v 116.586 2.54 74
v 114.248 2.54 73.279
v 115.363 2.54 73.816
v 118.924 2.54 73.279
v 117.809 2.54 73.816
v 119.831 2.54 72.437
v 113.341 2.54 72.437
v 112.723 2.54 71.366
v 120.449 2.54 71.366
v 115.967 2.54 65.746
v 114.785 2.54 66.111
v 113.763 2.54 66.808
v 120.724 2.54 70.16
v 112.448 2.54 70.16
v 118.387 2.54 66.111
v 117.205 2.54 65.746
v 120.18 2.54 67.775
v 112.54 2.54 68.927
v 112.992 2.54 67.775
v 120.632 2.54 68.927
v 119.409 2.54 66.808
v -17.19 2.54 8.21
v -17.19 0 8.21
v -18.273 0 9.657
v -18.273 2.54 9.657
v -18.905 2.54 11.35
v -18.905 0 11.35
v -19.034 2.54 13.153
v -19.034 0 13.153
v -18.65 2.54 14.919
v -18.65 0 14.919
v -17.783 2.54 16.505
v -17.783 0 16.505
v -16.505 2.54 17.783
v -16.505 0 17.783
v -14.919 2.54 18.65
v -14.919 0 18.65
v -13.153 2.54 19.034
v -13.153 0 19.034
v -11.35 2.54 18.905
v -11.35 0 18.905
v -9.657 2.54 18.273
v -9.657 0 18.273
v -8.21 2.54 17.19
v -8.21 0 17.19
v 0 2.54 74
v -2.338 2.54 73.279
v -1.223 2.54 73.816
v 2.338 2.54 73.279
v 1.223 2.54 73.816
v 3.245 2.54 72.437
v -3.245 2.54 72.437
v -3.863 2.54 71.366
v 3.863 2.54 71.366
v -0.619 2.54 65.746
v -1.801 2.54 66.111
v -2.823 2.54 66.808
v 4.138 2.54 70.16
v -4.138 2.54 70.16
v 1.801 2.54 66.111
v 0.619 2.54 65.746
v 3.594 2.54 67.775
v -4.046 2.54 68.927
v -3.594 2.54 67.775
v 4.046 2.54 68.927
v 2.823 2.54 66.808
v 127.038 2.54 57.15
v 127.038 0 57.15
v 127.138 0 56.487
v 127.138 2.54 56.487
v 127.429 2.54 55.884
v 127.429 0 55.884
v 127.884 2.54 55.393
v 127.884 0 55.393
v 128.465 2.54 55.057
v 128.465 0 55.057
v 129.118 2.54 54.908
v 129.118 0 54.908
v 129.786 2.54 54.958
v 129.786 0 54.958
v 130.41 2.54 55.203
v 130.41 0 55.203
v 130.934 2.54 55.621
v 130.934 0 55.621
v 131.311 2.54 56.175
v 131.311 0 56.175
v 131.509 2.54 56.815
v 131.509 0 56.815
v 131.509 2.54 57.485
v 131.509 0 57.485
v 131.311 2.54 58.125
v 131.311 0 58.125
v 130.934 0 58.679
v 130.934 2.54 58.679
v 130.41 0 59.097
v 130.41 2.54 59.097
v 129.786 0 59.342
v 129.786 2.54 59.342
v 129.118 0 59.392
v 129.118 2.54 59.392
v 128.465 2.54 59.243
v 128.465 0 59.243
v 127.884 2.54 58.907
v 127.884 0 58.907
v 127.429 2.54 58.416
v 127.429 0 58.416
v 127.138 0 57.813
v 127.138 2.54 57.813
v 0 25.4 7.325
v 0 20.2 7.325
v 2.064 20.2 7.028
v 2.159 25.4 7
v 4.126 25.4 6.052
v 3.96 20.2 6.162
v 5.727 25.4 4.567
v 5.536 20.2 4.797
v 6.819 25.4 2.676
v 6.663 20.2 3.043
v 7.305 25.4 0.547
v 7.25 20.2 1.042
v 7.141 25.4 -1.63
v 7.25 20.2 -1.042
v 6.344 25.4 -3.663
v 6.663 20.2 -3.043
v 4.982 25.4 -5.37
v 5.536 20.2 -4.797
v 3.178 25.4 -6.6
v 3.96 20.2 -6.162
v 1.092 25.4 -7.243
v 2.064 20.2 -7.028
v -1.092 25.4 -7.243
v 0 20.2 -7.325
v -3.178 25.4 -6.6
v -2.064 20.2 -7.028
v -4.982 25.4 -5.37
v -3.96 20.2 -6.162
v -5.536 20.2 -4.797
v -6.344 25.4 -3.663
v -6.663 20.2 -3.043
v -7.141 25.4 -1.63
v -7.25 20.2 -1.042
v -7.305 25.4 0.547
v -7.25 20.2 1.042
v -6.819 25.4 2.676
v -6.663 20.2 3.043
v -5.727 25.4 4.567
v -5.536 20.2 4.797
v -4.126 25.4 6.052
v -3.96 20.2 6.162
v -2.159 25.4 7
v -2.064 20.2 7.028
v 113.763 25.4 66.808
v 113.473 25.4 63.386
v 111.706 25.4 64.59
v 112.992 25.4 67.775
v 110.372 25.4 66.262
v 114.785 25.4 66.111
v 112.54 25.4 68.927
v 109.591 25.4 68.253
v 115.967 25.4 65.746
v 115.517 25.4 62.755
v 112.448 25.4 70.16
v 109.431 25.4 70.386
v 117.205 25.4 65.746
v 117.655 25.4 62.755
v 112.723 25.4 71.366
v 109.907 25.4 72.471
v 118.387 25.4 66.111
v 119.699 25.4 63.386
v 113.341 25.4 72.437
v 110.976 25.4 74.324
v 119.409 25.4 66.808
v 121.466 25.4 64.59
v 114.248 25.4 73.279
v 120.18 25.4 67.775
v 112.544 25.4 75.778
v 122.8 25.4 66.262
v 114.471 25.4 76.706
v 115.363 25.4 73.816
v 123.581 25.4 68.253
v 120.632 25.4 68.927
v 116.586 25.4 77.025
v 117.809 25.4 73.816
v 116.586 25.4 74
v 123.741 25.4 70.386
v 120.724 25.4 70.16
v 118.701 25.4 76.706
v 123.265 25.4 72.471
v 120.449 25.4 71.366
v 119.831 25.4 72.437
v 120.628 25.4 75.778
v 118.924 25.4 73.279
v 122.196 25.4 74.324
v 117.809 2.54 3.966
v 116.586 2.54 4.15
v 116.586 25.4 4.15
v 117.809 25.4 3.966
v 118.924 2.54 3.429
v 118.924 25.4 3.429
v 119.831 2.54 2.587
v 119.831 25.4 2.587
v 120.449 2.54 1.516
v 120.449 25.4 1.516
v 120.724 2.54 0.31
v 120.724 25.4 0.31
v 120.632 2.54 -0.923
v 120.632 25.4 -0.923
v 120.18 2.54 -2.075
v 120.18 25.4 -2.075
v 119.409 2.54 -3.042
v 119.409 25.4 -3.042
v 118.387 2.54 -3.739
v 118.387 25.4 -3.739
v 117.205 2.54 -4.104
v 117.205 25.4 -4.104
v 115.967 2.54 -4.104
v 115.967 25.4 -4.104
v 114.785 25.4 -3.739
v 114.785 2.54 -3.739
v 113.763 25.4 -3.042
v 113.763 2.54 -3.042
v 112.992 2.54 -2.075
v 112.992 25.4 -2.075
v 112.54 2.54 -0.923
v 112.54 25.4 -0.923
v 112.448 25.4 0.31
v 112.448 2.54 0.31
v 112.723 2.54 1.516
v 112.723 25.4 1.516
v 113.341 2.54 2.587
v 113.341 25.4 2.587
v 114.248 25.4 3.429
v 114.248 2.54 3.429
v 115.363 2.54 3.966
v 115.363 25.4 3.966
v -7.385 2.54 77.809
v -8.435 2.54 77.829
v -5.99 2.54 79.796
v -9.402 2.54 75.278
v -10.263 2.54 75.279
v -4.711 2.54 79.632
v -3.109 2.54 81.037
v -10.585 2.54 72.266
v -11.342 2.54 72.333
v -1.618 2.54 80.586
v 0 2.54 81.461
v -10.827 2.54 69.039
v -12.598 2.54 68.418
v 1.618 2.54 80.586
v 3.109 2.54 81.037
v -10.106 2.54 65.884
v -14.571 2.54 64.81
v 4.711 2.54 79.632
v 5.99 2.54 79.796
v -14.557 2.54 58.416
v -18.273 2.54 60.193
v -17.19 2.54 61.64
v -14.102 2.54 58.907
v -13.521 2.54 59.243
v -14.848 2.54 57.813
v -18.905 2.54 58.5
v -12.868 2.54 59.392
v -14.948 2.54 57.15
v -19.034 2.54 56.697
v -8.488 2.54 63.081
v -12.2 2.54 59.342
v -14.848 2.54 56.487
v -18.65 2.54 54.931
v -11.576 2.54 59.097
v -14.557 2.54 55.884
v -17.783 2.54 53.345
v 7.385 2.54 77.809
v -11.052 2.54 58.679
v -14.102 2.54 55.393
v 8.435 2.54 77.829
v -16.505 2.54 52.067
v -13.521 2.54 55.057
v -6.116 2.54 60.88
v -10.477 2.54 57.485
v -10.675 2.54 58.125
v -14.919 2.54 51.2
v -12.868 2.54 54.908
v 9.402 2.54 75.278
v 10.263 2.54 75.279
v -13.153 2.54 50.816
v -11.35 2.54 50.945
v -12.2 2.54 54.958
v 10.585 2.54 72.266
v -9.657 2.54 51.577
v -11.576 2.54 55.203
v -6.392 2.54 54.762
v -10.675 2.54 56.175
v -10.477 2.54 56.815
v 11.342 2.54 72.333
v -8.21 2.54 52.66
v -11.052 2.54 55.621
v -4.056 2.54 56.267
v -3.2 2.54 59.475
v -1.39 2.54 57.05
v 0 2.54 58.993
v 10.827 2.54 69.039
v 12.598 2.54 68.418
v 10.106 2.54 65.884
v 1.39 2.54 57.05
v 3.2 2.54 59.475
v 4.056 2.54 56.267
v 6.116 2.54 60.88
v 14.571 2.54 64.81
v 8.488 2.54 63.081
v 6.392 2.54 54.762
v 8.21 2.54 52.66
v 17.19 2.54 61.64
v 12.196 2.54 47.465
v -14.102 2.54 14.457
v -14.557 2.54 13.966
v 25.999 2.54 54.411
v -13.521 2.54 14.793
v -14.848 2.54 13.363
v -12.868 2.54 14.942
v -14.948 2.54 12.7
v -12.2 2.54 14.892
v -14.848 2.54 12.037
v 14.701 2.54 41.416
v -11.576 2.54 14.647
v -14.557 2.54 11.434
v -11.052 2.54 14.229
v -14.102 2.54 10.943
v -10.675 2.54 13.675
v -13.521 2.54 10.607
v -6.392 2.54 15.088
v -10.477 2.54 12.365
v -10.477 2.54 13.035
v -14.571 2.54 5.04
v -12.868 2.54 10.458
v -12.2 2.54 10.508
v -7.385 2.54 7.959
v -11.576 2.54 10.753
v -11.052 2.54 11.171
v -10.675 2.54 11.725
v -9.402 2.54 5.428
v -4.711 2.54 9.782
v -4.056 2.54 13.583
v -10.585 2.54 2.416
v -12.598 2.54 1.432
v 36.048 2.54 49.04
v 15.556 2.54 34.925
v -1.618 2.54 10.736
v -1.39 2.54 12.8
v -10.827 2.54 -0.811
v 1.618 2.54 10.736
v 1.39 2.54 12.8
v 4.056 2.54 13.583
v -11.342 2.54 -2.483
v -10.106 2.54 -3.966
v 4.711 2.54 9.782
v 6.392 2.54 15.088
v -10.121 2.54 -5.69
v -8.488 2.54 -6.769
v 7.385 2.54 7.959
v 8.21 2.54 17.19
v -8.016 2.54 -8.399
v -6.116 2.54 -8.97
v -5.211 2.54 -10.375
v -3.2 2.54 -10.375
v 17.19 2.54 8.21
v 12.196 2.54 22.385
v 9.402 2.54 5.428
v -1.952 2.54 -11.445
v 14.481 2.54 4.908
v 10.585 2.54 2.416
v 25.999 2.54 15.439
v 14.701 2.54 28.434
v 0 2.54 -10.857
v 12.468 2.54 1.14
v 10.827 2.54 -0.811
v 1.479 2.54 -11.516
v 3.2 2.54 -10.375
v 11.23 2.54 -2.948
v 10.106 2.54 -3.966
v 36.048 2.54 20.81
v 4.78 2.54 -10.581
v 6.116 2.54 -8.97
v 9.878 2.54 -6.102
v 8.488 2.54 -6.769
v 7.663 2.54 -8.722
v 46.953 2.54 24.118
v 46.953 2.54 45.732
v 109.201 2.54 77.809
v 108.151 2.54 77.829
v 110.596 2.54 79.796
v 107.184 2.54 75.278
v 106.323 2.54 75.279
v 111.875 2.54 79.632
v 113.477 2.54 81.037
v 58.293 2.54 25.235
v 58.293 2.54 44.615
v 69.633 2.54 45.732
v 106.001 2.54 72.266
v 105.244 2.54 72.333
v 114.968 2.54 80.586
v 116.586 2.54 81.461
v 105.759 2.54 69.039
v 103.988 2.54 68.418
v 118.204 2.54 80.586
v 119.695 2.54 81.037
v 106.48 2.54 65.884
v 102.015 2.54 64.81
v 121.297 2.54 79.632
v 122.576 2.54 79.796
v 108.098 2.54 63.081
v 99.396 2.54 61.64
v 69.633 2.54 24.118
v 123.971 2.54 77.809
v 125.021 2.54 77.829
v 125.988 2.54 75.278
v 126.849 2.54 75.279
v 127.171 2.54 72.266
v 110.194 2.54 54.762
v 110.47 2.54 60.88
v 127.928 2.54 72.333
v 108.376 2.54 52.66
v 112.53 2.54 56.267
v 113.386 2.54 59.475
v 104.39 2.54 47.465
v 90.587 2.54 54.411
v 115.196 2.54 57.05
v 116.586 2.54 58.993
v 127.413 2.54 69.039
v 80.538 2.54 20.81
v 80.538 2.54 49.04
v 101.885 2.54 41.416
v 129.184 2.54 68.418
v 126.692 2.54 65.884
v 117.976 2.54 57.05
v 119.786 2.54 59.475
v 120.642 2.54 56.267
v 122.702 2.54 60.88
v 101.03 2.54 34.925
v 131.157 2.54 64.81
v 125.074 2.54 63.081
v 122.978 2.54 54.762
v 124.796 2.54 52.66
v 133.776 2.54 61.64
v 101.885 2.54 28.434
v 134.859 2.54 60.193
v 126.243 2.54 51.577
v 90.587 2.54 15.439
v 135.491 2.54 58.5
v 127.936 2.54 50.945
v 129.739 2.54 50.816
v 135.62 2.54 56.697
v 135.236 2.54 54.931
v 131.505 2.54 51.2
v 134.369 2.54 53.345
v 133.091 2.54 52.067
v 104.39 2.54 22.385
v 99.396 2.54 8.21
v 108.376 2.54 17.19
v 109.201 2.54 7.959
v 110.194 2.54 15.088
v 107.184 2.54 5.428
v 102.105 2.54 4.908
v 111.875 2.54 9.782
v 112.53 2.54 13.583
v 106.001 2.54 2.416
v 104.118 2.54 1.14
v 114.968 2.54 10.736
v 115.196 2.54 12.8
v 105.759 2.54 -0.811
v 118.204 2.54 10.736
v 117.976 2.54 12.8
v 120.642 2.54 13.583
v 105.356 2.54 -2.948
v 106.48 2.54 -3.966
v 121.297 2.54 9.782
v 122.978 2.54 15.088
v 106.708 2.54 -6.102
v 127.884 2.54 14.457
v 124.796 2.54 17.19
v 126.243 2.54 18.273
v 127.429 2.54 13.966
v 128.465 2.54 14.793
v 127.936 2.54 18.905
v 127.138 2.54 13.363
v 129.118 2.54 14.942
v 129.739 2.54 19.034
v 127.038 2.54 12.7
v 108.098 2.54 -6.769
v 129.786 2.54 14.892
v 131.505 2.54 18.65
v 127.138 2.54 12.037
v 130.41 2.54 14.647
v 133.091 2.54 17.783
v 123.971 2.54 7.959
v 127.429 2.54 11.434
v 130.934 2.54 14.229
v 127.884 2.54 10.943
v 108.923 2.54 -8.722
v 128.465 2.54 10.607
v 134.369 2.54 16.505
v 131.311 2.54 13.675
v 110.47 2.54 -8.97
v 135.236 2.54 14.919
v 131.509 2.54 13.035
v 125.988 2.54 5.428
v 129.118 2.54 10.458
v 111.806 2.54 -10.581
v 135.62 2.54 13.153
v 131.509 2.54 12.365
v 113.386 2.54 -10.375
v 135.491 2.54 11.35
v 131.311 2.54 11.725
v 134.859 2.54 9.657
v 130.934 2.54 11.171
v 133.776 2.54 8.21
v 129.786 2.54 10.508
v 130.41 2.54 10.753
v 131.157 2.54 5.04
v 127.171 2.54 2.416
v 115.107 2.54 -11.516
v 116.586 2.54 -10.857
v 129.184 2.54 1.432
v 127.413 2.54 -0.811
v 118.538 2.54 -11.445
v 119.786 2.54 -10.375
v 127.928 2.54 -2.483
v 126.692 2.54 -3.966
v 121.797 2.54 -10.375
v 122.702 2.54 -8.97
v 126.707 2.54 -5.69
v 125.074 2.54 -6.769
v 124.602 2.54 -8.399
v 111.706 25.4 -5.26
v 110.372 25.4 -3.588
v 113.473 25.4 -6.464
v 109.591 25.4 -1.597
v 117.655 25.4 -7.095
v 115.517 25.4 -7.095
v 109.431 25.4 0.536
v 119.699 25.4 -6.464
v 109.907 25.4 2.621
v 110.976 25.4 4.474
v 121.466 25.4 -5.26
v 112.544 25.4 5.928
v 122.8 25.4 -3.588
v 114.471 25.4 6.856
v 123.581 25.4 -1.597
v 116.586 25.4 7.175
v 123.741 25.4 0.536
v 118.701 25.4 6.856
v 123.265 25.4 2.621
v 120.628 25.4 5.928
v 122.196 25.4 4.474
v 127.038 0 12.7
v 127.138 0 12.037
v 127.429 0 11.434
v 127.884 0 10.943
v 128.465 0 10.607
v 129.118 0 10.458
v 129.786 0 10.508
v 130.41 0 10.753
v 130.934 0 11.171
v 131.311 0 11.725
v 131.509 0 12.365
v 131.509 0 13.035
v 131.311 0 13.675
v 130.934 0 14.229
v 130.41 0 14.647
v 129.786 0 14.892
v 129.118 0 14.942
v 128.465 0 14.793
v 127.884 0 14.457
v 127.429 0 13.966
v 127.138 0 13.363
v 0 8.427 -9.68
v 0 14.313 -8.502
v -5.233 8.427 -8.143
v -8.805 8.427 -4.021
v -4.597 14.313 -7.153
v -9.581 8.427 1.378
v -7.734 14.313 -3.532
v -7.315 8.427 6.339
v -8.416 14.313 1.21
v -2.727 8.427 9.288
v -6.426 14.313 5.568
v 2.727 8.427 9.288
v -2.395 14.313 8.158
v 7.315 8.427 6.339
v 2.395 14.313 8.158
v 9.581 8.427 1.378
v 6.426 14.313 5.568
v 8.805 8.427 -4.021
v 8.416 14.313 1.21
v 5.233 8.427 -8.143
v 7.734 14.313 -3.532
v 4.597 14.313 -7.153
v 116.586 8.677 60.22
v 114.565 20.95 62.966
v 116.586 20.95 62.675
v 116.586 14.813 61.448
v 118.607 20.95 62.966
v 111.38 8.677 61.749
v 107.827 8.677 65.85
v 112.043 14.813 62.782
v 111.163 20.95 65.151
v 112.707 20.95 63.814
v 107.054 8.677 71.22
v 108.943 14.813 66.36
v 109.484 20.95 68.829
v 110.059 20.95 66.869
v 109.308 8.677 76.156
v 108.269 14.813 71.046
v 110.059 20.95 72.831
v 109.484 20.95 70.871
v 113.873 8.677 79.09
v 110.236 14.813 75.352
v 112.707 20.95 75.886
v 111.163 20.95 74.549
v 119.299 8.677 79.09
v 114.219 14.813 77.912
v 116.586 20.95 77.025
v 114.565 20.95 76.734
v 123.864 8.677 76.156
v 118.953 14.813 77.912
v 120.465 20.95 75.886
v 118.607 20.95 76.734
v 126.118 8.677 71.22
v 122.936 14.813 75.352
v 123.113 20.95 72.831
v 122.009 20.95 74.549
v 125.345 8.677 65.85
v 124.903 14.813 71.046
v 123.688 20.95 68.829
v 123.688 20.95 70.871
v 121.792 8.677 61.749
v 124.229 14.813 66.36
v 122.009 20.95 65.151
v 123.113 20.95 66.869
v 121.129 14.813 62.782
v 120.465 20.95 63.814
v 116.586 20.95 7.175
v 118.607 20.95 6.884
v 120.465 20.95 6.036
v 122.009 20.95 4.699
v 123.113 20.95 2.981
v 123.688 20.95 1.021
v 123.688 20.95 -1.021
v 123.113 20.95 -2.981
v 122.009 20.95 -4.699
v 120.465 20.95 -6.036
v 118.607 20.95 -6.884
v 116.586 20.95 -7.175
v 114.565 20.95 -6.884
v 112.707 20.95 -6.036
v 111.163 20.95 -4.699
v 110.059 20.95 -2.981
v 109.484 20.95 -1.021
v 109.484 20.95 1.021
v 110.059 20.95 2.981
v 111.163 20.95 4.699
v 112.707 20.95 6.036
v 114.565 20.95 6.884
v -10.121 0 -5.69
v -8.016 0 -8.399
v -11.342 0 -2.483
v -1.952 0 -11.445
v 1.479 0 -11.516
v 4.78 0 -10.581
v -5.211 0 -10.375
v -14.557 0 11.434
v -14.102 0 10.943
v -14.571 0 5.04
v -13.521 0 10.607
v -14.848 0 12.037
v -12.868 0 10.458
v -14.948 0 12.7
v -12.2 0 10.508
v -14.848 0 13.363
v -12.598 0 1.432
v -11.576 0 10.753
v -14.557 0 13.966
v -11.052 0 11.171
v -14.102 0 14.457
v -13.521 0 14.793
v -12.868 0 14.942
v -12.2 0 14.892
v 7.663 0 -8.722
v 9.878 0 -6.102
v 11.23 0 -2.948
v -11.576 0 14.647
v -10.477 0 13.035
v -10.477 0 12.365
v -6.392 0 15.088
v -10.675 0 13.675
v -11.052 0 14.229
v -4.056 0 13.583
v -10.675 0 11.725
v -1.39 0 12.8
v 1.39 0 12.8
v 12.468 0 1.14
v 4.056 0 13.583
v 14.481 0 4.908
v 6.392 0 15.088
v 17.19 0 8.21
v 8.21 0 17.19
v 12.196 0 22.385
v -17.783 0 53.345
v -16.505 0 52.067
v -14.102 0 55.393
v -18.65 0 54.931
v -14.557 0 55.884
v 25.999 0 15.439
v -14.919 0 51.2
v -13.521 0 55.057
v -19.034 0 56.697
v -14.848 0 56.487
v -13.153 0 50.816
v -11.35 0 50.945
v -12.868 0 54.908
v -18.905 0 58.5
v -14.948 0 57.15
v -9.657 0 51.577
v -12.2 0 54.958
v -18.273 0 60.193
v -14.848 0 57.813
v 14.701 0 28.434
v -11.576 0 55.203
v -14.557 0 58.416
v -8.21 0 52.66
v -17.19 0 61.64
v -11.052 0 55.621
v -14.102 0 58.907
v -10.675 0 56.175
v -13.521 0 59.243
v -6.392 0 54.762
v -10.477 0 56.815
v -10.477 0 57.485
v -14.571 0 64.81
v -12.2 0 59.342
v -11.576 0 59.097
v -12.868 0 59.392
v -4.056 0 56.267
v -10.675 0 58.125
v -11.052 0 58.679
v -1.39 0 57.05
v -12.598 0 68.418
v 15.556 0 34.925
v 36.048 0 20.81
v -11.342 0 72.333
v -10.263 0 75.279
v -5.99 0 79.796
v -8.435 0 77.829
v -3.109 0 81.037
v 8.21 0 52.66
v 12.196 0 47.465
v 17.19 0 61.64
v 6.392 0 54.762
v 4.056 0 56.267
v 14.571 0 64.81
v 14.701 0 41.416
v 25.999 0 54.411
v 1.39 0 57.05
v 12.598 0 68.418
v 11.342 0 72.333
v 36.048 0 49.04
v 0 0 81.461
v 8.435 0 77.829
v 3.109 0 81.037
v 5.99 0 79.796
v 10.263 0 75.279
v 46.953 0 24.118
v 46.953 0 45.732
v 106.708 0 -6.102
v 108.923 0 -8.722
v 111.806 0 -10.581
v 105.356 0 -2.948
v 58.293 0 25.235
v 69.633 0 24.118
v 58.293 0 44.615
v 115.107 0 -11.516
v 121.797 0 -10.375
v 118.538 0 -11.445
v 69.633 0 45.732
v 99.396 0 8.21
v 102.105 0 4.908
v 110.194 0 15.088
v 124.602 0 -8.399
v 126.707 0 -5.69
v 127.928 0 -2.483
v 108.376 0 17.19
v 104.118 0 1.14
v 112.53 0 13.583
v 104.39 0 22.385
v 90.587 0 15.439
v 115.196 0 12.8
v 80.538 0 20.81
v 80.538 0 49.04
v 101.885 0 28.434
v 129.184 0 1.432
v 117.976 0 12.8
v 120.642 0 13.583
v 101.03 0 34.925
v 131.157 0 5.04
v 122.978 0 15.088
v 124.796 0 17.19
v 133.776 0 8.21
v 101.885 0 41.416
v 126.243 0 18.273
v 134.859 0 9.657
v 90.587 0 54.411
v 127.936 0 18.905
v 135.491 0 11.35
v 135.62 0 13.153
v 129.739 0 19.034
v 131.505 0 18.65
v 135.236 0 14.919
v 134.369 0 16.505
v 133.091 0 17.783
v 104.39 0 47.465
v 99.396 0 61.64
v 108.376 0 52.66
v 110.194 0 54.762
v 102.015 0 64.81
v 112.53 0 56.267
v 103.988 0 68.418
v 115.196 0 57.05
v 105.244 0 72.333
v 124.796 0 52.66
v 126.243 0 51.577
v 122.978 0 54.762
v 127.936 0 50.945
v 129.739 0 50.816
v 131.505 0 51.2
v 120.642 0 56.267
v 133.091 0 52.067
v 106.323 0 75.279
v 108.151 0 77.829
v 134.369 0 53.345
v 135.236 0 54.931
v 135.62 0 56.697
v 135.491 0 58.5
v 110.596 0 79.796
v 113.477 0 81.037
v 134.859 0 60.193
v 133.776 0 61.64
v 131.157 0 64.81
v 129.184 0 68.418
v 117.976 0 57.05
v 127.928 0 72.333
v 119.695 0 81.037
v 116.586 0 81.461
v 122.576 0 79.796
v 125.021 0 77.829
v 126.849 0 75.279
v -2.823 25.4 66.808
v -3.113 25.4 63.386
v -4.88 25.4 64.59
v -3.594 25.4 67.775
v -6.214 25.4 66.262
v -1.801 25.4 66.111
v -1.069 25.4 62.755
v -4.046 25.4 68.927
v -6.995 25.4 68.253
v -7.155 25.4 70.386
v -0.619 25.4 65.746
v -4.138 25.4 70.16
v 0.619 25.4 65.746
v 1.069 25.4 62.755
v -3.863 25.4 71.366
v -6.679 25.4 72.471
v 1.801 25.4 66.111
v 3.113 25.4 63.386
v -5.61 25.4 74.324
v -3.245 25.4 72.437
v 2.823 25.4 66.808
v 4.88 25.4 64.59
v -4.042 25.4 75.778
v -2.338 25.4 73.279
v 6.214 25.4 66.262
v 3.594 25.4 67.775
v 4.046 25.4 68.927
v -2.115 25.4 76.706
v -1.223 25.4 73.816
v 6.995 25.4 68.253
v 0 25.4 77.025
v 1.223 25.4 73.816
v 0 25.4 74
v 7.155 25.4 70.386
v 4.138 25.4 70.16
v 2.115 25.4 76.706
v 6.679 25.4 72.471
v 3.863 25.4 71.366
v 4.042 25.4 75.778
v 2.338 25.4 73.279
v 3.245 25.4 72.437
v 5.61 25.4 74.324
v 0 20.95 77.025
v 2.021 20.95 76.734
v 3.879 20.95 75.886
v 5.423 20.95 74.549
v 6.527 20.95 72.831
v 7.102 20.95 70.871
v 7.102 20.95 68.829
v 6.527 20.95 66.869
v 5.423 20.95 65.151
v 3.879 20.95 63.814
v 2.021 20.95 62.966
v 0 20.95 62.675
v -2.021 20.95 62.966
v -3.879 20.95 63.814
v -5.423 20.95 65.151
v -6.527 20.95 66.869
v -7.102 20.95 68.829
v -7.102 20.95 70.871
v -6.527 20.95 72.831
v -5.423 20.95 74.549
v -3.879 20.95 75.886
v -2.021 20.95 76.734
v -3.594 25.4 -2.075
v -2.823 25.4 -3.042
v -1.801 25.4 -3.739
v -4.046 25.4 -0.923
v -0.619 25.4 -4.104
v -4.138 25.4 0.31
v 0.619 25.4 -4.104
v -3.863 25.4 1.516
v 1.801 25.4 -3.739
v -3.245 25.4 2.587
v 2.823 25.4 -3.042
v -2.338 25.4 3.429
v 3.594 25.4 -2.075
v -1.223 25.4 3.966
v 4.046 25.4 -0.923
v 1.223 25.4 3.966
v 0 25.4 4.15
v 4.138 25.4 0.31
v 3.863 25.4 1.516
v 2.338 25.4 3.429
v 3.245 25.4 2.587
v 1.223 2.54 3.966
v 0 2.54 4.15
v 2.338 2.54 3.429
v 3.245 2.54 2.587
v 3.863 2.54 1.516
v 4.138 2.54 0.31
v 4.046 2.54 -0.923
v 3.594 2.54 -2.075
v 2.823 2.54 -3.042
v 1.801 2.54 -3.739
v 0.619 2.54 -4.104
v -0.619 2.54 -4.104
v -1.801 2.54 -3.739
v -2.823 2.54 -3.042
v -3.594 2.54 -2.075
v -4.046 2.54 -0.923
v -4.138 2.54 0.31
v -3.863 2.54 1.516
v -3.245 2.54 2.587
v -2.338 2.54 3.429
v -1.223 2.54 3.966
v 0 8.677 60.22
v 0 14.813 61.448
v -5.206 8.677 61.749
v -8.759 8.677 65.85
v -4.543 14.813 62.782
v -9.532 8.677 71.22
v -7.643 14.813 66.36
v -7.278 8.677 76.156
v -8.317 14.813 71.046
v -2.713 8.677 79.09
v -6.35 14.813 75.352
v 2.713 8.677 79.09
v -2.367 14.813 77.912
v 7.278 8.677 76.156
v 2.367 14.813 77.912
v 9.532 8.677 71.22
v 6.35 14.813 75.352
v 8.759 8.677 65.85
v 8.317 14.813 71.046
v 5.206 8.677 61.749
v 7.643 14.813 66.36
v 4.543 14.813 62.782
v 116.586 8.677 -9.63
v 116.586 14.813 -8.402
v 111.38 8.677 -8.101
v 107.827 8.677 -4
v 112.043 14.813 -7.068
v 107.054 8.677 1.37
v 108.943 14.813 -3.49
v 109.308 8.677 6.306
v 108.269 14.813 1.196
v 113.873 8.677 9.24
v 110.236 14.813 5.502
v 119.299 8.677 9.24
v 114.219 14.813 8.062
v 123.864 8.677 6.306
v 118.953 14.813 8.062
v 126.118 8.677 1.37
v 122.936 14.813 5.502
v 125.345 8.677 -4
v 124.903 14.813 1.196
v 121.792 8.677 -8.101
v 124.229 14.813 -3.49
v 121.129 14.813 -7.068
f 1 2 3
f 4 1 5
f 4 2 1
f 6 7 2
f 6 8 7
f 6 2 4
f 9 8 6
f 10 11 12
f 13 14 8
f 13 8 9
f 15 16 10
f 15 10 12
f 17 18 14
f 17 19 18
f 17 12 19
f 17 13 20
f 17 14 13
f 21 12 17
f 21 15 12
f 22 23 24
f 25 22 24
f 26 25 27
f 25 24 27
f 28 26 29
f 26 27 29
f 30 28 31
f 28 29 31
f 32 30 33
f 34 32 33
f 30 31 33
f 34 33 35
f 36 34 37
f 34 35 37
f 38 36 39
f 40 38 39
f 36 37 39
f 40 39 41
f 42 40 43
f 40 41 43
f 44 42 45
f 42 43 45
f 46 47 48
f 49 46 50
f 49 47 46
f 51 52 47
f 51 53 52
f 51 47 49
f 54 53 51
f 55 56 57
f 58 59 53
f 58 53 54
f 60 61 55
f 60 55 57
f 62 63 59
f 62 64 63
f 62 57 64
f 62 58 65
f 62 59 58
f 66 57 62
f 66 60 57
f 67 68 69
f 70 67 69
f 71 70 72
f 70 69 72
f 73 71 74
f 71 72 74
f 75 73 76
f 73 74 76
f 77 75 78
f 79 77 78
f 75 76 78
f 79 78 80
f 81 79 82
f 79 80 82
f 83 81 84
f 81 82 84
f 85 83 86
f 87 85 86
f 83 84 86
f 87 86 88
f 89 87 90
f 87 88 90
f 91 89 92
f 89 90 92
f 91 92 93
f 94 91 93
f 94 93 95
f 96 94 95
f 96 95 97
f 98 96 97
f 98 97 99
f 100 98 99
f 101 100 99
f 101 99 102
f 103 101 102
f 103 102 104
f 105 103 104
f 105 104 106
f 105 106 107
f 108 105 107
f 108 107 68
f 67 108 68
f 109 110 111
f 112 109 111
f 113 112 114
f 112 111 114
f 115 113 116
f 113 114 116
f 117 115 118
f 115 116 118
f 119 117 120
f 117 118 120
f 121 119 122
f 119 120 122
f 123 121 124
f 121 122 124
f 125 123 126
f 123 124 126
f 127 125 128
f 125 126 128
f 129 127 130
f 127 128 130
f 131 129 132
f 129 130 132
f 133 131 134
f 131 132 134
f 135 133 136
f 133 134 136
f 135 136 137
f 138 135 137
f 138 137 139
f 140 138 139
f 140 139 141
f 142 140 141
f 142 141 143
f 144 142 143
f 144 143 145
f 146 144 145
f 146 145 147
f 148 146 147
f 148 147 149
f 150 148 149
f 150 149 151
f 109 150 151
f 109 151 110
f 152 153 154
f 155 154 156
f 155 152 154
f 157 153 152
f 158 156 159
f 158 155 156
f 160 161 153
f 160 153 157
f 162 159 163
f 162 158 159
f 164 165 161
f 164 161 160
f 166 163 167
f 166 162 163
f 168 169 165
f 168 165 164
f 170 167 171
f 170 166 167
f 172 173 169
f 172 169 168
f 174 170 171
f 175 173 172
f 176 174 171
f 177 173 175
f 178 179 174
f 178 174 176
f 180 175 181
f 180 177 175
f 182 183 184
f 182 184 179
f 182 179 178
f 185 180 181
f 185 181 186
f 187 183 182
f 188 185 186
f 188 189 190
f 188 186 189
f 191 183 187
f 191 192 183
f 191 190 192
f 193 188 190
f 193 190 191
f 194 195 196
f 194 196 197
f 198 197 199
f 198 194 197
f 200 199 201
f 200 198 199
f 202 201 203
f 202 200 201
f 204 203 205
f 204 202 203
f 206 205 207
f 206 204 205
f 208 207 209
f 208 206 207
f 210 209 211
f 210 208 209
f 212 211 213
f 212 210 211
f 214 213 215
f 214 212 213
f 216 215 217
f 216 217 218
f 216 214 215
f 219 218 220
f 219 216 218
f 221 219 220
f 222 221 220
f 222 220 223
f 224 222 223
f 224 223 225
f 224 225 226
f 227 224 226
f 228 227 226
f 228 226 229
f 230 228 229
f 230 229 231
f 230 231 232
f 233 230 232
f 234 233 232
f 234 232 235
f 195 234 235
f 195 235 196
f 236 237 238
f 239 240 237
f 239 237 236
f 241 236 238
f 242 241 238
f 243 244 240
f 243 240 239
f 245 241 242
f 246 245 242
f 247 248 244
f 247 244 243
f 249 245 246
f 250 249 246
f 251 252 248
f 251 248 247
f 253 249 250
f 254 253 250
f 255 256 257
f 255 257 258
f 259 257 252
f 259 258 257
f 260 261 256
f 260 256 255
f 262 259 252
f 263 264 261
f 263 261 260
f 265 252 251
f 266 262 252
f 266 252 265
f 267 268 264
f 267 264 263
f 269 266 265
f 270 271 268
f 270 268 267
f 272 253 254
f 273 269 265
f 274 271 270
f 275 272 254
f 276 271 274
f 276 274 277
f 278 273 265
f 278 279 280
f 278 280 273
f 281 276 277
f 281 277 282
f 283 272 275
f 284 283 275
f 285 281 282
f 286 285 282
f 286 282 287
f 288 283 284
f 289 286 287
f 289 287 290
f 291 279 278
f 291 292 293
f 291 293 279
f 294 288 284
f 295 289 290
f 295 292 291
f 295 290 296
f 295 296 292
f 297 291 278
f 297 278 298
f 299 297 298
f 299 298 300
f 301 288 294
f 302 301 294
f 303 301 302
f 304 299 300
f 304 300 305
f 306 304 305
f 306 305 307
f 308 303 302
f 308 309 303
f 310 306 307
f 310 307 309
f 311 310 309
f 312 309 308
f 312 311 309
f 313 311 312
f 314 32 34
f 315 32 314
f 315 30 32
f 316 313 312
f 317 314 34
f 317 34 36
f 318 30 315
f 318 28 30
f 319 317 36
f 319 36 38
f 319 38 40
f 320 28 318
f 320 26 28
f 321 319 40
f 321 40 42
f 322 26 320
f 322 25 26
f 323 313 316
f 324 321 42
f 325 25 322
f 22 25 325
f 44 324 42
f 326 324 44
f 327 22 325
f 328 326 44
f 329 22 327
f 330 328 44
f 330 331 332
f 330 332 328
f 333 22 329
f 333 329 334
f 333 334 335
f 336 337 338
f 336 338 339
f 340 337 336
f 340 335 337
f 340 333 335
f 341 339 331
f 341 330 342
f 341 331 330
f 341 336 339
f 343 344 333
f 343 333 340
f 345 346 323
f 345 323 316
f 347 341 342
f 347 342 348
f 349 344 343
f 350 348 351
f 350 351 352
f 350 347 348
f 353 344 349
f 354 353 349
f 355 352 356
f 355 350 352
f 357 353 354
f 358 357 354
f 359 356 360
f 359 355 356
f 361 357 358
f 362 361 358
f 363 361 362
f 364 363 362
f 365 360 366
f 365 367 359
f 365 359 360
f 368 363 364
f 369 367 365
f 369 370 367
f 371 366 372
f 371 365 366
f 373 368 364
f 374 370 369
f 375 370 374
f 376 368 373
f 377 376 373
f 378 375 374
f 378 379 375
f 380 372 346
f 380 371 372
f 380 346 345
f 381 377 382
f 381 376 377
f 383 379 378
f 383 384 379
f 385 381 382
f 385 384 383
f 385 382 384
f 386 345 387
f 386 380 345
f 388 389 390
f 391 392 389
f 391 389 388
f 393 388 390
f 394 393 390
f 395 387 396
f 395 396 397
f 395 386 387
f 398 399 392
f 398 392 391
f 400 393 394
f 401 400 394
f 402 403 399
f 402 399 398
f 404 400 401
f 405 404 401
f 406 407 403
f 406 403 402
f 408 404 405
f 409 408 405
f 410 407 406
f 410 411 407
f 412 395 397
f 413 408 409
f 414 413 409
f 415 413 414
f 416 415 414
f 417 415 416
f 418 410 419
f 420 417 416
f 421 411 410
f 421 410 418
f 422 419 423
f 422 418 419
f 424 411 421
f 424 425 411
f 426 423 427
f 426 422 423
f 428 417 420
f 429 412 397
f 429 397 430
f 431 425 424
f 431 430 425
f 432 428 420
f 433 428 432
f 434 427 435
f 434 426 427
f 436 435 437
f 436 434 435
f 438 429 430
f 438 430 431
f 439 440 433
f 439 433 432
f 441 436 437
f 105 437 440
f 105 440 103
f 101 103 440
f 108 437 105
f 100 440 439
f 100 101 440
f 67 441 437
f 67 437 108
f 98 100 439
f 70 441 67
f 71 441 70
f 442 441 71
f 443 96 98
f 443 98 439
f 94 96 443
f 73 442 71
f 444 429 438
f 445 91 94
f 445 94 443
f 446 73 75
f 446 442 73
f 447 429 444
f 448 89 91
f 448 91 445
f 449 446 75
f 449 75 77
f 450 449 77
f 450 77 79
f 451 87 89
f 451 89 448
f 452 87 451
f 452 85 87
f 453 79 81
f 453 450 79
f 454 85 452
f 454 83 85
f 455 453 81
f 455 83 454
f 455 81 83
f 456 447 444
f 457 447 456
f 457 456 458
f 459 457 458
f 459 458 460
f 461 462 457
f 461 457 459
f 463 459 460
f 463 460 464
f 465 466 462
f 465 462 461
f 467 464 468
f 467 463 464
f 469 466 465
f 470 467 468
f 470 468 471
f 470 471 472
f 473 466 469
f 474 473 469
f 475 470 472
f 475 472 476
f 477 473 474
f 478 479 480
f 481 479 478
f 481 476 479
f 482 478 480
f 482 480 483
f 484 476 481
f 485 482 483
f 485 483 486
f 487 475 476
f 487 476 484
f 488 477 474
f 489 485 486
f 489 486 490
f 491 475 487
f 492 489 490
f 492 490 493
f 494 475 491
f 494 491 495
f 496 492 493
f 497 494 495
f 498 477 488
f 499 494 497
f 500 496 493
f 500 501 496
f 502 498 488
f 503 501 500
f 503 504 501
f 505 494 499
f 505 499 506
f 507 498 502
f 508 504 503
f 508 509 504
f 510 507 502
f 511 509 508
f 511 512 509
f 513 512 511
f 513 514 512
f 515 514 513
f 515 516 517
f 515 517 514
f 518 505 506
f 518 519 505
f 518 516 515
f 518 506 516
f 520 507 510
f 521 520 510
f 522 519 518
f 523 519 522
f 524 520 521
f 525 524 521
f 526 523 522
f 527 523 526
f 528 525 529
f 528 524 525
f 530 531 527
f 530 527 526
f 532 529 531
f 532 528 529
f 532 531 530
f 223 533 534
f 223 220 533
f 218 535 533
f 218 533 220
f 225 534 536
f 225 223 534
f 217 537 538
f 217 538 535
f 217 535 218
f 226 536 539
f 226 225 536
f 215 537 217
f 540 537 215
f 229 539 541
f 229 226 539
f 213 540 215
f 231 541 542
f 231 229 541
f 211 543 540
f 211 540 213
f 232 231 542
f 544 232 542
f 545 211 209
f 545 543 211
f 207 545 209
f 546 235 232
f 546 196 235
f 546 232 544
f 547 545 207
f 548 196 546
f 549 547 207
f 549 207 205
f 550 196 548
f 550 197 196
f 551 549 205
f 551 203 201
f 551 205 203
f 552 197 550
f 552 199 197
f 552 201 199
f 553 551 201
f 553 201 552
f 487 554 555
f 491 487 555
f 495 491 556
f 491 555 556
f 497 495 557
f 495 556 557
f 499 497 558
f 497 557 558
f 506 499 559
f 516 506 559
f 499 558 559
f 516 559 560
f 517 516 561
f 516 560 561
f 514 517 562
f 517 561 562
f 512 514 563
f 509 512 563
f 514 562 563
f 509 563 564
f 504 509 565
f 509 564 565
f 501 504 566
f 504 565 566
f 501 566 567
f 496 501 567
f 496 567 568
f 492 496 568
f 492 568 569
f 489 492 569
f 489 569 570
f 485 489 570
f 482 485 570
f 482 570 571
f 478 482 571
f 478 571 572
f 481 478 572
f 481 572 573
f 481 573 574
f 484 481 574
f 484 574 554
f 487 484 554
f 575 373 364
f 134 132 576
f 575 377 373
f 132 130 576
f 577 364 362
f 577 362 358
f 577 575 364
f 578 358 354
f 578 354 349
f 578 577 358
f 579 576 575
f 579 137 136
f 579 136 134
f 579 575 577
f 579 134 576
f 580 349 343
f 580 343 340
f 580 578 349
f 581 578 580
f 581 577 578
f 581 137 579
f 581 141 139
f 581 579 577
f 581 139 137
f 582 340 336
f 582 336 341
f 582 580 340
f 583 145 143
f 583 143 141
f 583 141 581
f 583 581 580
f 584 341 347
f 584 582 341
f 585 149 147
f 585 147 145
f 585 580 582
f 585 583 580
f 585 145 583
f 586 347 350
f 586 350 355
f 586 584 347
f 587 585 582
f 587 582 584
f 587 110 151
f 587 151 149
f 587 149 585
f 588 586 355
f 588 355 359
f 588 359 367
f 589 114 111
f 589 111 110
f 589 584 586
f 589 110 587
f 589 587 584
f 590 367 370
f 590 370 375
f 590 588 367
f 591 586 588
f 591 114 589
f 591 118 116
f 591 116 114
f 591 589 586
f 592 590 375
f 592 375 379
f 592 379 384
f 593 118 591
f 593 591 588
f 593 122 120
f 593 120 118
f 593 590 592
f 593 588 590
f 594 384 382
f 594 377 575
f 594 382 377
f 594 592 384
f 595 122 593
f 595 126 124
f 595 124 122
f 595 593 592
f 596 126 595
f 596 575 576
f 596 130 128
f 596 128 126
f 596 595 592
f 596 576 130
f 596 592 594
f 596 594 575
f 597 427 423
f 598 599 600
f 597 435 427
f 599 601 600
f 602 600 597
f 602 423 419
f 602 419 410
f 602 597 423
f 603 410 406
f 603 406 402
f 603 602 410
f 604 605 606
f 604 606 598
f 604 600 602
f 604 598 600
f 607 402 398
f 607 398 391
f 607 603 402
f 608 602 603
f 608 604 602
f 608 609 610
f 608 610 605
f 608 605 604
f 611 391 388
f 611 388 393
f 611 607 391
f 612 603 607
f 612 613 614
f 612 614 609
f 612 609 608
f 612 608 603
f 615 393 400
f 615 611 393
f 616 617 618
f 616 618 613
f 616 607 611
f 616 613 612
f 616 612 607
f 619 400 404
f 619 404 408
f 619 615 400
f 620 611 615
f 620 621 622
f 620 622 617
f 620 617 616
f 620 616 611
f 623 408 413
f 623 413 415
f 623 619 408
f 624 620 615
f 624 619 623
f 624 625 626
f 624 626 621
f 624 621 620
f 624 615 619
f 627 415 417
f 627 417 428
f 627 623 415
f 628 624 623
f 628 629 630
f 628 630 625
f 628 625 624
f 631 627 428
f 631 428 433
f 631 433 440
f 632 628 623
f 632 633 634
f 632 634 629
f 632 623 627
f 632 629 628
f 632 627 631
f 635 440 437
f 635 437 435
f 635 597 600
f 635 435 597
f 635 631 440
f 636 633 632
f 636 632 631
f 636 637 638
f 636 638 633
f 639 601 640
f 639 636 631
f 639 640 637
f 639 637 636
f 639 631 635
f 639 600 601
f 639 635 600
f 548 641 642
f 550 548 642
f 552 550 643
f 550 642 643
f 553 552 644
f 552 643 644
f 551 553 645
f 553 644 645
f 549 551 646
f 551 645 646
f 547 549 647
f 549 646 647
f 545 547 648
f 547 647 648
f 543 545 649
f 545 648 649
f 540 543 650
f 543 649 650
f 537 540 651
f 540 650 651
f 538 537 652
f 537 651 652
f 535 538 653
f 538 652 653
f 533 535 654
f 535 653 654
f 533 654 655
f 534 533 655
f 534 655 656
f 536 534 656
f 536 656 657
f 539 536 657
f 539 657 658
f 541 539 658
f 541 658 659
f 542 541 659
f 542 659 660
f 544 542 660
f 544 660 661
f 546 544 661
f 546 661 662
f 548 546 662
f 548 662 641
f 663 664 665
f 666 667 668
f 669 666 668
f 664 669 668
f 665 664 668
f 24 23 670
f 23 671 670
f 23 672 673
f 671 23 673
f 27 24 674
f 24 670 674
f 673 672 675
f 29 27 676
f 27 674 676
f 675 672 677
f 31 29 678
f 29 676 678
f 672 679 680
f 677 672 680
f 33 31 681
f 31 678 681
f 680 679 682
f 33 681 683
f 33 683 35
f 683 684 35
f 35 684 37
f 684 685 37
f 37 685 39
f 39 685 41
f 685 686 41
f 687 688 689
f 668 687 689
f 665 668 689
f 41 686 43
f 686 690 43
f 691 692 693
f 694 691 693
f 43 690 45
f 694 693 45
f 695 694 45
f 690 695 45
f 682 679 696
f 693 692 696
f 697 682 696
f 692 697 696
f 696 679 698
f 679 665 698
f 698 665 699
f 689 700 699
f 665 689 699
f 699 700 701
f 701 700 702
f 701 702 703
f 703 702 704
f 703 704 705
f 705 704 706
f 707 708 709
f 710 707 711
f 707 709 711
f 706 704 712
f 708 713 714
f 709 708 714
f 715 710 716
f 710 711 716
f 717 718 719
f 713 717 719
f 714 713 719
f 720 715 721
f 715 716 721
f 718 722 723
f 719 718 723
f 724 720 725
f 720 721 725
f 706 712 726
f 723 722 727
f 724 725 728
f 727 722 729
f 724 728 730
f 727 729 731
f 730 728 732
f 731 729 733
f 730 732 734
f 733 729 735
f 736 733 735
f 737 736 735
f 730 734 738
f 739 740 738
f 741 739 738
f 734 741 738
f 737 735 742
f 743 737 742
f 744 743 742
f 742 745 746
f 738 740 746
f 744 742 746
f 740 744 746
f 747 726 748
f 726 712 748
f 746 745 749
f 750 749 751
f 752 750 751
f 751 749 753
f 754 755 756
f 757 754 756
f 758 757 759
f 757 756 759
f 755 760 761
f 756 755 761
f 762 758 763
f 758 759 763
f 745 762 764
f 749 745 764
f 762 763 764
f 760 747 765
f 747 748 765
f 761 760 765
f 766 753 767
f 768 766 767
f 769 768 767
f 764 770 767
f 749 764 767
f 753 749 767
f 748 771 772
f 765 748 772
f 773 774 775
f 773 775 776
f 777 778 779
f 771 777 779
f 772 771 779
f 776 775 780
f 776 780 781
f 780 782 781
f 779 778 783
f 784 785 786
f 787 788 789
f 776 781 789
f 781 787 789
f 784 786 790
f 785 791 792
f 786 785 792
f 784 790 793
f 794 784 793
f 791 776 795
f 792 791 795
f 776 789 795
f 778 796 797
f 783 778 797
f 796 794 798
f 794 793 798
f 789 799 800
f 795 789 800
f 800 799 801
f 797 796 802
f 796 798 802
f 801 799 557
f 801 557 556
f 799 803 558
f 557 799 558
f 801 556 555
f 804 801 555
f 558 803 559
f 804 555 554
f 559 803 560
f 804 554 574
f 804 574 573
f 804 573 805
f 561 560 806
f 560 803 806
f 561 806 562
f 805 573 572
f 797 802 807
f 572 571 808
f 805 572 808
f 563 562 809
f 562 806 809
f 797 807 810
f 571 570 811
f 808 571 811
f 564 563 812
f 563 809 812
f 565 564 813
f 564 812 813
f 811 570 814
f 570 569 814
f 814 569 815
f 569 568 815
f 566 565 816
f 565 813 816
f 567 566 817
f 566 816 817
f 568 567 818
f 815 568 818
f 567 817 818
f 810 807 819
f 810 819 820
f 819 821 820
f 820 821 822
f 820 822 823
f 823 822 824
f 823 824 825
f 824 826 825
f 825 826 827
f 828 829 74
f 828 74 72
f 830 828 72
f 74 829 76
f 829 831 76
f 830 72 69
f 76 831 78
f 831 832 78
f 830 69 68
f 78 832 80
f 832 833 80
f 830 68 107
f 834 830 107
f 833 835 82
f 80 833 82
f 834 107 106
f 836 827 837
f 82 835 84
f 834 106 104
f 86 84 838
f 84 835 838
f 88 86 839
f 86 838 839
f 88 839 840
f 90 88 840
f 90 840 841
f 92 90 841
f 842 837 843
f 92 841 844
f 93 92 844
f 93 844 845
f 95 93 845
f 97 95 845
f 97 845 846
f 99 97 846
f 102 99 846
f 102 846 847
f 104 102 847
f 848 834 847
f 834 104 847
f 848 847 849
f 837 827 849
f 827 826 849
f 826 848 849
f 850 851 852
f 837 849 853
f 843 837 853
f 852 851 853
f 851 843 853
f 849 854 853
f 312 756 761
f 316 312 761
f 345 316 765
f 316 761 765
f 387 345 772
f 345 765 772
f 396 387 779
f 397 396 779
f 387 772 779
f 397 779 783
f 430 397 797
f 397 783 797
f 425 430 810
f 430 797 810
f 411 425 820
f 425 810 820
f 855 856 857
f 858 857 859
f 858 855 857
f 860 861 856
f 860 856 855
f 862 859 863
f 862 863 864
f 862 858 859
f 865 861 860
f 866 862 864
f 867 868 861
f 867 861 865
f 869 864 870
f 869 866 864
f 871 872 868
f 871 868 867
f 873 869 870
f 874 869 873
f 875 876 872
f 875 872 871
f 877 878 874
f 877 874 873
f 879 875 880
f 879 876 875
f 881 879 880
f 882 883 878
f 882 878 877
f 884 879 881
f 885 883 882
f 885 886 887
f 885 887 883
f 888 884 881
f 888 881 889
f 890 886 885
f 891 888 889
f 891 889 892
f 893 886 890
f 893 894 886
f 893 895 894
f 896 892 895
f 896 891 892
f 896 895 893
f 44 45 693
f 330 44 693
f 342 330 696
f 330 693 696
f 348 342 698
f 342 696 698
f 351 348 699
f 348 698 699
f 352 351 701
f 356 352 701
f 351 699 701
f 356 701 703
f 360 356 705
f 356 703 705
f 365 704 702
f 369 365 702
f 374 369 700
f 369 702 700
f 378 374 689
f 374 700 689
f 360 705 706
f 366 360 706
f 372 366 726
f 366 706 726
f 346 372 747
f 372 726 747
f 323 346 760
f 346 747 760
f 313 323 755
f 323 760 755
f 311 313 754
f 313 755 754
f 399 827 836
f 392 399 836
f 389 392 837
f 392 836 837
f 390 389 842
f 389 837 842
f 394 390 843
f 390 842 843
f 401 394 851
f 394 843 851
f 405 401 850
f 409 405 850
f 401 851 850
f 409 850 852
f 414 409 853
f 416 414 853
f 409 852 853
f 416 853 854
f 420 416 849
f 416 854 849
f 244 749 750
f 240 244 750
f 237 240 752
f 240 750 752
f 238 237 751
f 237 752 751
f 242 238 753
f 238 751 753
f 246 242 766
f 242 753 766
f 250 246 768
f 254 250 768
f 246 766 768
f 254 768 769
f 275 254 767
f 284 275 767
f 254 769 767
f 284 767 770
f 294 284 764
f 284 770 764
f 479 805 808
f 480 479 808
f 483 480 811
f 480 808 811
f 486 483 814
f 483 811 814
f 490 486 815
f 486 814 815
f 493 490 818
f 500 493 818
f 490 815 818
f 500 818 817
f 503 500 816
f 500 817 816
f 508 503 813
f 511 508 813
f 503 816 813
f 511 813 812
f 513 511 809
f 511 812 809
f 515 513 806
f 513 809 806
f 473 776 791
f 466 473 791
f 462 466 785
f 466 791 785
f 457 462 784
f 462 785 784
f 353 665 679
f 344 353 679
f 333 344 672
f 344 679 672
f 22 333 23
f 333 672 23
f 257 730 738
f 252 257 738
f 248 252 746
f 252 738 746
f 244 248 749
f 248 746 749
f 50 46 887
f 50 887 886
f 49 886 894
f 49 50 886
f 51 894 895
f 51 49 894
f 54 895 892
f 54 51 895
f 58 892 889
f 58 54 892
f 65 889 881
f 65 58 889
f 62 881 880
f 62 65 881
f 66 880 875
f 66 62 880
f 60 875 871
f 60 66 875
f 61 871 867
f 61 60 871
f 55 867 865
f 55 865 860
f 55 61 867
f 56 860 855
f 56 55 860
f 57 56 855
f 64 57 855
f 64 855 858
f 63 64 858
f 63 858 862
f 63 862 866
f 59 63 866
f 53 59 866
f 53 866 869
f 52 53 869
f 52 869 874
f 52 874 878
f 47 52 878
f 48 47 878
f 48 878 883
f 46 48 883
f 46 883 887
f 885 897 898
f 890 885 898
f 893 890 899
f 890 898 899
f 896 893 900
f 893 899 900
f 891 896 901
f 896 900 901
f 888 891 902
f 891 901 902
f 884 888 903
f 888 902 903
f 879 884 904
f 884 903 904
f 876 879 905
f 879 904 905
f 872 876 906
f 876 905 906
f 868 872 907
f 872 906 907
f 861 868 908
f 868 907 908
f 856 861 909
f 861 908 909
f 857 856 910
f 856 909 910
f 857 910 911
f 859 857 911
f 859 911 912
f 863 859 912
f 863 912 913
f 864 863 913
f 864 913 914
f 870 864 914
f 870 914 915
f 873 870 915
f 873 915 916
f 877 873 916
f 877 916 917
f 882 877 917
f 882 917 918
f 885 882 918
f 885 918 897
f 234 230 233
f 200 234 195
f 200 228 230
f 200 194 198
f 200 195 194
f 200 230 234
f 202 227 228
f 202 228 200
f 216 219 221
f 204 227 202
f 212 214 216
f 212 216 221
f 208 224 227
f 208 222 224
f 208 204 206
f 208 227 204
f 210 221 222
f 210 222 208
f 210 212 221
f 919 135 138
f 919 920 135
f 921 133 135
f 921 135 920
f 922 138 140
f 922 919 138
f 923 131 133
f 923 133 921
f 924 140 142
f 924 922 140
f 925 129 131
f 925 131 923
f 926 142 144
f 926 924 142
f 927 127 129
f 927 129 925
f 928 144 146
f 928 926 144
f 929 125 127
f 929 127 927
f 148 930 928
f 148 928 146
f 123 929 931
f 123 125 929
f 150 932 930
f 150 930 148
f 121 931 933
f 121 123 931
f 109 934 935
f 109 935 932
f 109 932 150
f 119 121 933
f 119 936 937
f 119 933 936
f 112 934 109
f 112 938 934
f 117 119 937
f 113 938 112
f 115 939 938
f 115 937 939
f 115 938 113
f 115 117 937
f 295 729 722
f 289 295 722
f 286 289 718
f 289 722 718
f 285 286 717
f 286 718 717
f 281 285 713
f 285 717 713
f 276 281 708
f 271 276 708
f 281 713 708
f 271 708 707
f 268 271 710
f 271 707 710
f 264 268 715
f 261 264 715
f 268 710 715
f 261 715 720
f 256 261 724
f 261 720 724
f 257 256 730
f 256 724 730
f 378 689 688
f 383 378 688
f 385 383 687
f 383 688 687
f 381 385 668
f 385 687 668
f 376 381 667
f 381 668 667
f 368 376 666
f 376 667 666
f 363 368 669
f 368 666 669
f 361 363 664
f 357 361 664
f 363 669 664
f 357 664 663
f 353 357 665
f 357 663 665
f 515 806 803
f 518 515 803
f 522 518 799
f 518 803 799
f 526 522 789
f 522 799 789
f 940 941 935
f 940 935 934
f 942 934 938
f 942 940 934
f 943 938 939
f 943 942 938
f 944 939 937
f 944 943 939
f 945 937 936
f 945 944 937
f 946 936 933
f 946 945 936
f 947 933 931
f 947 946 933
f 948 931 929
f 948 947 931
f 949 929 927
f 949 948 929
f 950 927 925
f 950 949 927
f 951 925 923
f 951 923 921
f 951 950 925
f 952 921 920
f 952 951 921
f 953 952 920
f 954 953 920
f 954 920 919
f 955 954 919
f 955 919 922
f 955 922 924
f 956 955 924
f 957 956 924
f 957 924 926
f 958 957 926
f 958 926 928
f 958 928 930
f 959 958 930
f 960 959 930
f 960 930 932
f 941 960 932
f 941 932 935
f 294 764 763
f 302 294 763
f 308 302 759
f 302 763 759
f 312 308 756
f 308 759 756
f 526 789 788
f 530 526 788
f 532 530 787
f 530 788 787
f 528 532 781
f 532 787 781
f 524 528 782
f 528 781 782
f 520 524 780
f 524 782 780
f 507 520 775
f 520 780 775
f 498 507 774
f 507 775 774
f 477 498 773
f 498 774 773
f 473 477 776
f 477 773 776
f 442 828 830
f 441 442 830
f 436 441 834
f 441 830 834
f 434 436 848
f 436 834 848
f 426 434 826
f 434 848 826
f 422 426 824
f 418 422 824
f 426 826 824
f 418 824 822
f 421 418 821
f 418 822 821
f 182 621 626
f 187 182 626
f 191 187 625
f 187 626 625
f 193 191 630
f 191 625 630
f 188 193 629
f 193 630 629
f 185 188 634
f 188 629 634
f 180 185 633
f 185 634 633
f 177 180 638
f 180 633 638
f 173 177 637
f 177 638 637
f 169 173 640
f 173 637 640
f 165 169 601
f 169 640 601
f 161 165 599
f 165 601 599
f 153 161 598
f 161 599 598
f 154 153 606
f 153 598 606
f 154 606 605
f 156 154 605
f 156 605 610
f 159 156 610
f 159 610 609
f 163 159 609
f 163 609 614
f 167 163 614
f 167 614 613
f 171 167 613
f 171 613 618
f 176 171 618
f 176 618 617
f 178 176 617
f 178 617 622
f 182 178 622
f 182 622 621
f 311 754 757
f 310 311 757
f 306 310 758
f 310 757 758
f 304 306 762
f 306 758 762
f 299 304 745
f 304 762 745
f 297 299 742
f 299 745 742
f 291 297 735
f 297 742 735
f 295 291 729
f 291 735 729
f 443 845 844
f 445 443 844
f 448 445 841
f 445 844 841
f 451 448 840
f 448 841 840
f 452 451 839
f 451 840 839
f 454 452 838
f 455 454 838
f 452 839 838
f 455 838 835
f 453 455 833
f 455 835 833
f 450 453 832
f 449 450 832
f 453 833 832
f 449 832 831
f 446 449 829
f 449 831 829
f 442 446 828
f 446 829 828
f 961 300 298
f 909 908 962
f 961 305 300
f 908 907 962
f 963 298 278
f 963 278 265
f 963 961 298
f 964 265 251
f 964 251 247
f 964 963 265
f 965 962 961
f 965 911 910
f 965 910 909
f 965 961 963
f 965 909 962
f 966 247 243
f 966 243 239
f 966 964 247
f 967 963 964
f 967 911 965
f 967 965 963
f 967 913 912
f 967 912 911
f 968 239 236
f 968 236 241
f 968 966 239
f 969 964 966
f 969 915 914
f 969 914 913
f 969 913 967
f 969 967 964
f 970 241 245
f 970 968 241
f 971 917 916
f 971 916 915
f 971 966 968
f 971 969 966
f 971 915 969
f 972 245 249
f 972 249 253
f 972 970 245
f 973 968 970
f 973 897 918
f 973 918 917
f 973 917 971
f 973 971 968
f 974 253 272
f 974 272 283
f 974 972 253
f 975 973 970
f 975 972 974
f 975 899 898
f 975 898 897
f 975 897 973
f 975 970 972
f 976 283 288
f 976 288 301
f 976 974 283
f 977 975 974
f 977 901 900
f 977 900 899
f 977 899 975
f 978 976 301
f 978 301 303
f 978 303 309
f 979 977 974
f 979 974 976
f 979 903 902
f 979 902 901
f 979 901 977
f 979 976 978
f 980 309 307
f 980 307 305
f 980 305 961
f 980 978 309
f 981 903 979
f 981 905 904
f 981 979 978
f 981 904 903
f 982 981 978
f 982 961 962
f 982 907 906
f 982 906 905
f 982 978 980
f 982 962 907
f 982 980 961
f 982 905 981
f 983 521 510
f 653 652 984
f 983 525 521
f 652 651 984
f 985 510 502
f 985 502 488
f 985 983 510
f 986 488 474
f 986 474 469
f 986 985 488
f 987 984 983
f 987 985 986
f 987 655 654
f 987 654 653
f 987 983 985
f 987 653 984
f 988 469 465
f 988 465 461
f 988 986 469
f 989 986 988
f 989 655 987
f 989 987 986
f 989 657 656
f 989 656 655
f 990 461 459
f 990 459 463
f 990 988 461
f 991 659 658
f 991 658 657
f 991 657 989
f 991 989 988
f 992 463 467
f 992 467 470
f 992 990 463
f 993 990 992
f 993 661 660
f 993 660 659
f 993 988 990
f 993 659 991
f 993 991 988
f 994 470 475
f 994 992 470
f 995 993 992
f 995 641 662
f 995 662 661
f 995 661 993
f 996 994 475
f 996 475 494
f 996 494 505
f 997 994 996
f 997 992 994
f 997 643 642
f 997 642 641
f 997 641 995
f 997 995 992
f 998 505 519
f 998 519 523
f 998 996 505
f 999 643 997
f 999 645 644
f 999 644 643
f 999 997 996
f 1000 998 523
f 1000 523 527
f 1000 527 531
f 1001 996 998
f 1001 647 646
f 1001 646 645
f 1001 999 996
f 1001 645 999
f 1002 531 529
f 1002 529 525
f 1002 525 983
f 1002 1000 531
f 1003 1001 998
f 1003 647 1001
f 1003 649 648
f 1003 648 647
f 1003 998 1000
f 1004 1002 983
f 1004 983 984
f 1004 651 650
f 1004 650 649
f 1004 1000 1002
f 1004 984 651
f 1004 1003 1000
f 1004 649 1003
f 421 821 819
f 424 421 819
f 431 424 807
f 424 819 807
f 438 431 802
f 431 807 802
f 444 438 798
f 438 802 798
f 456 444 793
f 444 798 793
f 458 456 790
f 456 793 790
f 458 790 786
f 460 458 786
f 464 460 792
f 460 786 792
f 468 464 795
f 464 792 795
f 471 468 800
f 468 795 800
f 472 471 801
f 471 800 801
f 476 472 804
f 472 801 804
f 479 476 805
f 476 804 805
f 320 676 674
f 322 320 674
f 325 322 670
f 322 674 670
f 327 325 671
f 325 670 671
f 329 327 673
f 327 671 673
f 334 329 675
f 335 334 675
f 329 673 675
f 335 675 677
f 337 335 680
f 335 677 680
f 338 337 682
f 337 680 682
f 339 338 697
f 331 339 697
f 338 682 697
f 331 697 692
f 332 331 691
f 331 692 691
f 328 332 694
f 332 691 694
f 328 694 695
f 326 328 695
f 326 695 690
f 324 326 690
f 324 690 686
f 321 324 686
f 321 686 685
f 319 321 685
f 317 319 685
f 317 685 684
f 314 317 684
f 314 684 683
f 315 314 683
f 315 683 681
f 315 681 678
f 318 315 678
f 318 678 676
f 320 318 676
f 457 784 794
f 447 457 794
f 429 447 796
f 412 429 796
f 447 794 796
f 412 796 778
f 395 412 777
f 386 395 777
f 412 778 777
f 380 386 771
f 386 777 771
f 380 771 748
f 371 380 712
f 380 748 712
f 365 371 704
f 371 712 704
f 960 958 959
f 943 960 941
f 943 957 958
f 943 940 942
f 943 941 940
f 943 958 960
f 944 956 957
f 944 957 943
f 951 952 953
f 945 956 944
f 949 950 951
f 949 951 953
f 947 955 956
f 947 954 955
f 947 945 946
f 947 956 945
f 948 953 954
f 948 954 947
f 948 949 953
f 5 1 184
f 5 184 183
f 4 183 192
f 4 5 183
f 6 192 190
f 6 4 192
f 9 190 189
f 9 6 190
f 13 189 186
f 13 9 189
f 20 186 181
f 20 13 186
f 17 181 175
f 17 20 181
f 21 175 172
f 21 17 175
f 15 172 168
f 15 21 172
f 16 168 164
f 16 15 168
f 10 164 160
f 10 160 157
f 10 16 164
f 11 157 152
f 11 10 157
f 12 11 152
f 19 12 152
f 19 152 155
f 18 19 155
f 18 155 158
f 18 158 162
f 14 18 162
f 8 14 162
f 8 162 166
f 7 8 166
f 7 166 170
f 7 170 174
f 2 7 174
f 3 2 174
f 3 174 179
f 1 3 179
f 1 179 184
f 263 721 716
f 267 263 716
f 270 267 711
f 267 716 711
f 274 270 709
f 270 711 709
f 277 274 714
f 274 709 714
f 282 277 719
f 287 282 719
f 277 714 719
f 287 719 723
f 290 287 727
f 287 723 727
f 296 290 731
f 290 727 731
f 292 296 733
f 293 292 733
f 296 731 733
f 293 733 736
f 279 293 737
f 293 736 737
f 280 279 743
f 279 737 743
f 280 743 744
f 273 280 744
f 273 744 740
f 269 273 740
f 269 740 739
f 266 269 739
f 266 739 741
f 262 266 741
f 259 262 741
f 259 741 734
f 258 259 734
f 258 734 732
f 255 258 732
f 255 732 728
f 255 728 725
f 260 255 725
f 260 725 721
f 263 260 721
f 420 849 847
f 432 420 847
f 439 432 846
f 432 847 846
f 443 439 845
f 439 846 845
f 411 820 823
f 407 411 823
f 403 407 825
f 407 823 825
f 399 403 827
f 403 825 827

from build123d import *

# Parameters (mm, degrees)
BOSS_EXTRUDE1_DEPTH   = 2.54
SKETCH1_4_R           = 7.325
SKETCH1_4_R_2         = 4.15
SKETCH1_4_R_3         = 7.175
BOSS_EXTRUDE2_DEPTH   = 25.4
F_8_CLEARANCE_HOLE2_D = 4.4958
LPATTERN1_COUNT       = 2
LPATTERN1_PITCH       = 116.586
LPATTERN1_COUNT_DIR2  = 2
LPATTERN1_PITCH_DIR2  = 69.85


with BuildPart() as part:
    # Sketch1 → Boss-Extrude1 (new body)
    with BuildSketch(Plane(origin=(0, 0, 0), x_dir=(1, 0, 0), z_dir=(0, 1, 0))):
        with BuildLine():
            ThreePointArc((8.209871939, -17.190128061), (15.555896424, -34.925), (8.209871939, -52.659871939))
            ThreePointArc((8.209871939, -52.659871939), (0, -57.15), (-8.209871939, -52.659871939))
            ThreePointArc((-8.209871939, -52.659871939), (-17.190128061, -52.659871939), (-17.190128061, -61.640128061))
            ThreePointArc((-17.190128061, -61.640128061), (-13.499098781, -66.567297756), (-11.341832503, -72.333310292))
            ThreePointArc((-11.341832503, -72.333310292), (0, -81.460512242), (11.341832503, -72.333310292))
            ThreePointArc((11.341832503, -72.333310292), (13.499098781, -66.567297756), (17.190128061, -61.640128061))
            ThreePointArc((17.190128061, -61.640128061), (58.293, -44.614761051), (99.395871939, -61.640128061))
            ThreePointArc((99.395871939, -61.640128061), (103.086901219, -66.567297756), (105.244167497, -72.333310292))
            ThreePointArc((105.244167497, -72.333310292), (116.586, -81.460512242), (127.927832503, -72.333310292))
            ThreePointArc((127.927832503, -72.333310292), (130.085098781, -66.567297756), (133.776128061, -61.640128061))
            ThreePointArc((133.776128061, -61.640128061), (133.776128061, -52.659871939), (124.795871939, -52.659871939))
            ThreePointArc((124.795871939, -52.659871939), (116.586, -57.15), (108.376128061, -52.659871939))
            ThreePointArc((108.376128061, -52.659871939), (101.030103576, -34.925), (108.376128061, -17.190128061))
            ThreePointArc((108.376128061, -17.190128061), (116.586, -12.7), (124.795871939, -17.190128061))
            ThreePointArc((124.795871939, -17.190128061), (133.776128061, -17.190128061), (133.776128061, -8.209871939))
            ThreePointArc((133.776128061, -8.209871939), (130.085098781, -3.282702244), (127.927832503, 2.483310292))
            ThreePointArc((127.927832503, 2.483310292), (116.825136798, 11.608049281), (105.356064016, 2.948310079))
            ThreePointArc((105.356064016, 2.948310079), (103.204339104, -3.073259016), (99.395871939, -8.209871939))
            ThreePointArc((99.395871939, -8.209871939), (58.293, -25.235238949), (17.190128061, -8.209871939))
            ThreePointArc((17.190128061, -8.209871939), (13.381660896, -3.073259016), (11.229935984, 2.948310079))
            ThreePointArc((11.229935984, 2.948310079), (-0.239136798, 11.608049281), (-11.341832503, 2.483310292))
            ThreePointArc((-11.341832503, 2.483310292), (-13.499098781, -3.282702244), (-17.190128061, -8.209871939))
            ThreePointArc((-17.190128061, -8.209871939), (-17.190128061, -17.190128061), (-8.209871939, -17.190128061))
            ThreePointArc((-8.209871939, -17.190128061), (0, -12.7), (8.209871939, -17.190128061))
        make_face()
    extrude(amount=BOSS_EXTRUDE1_DEPTH)

    # Sketch1<4> → Boss-Extrude2 (add)
    # profile 1 of 4: a face of its own
    with BuildSketch(Plane(origin=(0, 0, 0), x_dir=(1, 0, 0), z_dir=(0, 1, 0))):
        Circle(SKETCH1_4_R)
        Circle(SKETCH1_4_R_2, mode=Mode.SUBTRACT)
    # profile 2 of 4: a face of its own
    with BuildSketch(Plane(origin=(0, 0, 0), x_dir=(1, 0, 0), z_dir=(0, 1, 0))):
        with Locations((116.586, 0)):
            Circle(SKETCH1_4_R_3)
        with Locations((116.586, 0)):
            Circle(SKETCH1_4_R_2, mode=Mode.SUBTRACT)
    # profile 3 of 4: a face of its own
    with BuildSketch(Plane(origin=(0, 0, 0), x_dir=(1, 0, 0), z_dir=(0, 1, 0))):
        with Locations((0, -69.85)):
            Circle(SKETCH1_4_R_3)
        with Locations((0, -69.85)):
            Circle(SKETCH1_4_R_2, mode=Mode.SUBTRACT)
    # profile 4 of 4: a face of its own
    with BuildSketch(Plane(origin=(0, 0, 0), x_dir=(1, 0, 0), z_dir=(0, 1, 0))):
        with Locations((116.586, -69.85)):
            Circle(SKETCH1_4_R_3)
        with Locations((116.586, -69.85)):
            Circle(SKETCH1_4_R_2, mode=Mode.SUBTRACT)
    extrude(amount=BOSS_EXTRUDE2_DEPTH)

    # #8 Clearance Hole2 (through all)
    with Locations(Plane(origin=(0, 2.54, 0), x_dir=(1, 0, 0), z_dir=(0, 1, 0))):
        with Locations((129.286, -12.7), (129.286, -57.15), (-12.7, -57.15), (-12.7, -12.7)):
            Hole(F_8_CLEARANCE_HOLE2_D / 2)

    # Sketch8 → Revolve1 (revolve)
    with BuildSketch(Plane(origin=(0, 0, 0), x_dir=(0, 0, -1), z_dir=(1, 0, 0))):
        Polygon((10.856911267, 2.54), (7.046911267, 21.59), (7.046911267, 2.54), align=None)
    revolve1 = revolve(axis=Axis((0, 0, 0), (0, 1, 0)))

    # LPattern1: Revolve1 2 × 2
    with Locations(*[(i * LPATTERN1_PITCH, 0, j * LPATTERN1_PITCH_DIR2) for i in range(LPATTERN1_COUNT) for j in range(LPATTERN1_COUNT_DIR2) if (i, j) != (0, 0)]):
        add(revolve1)


solid = part.part
